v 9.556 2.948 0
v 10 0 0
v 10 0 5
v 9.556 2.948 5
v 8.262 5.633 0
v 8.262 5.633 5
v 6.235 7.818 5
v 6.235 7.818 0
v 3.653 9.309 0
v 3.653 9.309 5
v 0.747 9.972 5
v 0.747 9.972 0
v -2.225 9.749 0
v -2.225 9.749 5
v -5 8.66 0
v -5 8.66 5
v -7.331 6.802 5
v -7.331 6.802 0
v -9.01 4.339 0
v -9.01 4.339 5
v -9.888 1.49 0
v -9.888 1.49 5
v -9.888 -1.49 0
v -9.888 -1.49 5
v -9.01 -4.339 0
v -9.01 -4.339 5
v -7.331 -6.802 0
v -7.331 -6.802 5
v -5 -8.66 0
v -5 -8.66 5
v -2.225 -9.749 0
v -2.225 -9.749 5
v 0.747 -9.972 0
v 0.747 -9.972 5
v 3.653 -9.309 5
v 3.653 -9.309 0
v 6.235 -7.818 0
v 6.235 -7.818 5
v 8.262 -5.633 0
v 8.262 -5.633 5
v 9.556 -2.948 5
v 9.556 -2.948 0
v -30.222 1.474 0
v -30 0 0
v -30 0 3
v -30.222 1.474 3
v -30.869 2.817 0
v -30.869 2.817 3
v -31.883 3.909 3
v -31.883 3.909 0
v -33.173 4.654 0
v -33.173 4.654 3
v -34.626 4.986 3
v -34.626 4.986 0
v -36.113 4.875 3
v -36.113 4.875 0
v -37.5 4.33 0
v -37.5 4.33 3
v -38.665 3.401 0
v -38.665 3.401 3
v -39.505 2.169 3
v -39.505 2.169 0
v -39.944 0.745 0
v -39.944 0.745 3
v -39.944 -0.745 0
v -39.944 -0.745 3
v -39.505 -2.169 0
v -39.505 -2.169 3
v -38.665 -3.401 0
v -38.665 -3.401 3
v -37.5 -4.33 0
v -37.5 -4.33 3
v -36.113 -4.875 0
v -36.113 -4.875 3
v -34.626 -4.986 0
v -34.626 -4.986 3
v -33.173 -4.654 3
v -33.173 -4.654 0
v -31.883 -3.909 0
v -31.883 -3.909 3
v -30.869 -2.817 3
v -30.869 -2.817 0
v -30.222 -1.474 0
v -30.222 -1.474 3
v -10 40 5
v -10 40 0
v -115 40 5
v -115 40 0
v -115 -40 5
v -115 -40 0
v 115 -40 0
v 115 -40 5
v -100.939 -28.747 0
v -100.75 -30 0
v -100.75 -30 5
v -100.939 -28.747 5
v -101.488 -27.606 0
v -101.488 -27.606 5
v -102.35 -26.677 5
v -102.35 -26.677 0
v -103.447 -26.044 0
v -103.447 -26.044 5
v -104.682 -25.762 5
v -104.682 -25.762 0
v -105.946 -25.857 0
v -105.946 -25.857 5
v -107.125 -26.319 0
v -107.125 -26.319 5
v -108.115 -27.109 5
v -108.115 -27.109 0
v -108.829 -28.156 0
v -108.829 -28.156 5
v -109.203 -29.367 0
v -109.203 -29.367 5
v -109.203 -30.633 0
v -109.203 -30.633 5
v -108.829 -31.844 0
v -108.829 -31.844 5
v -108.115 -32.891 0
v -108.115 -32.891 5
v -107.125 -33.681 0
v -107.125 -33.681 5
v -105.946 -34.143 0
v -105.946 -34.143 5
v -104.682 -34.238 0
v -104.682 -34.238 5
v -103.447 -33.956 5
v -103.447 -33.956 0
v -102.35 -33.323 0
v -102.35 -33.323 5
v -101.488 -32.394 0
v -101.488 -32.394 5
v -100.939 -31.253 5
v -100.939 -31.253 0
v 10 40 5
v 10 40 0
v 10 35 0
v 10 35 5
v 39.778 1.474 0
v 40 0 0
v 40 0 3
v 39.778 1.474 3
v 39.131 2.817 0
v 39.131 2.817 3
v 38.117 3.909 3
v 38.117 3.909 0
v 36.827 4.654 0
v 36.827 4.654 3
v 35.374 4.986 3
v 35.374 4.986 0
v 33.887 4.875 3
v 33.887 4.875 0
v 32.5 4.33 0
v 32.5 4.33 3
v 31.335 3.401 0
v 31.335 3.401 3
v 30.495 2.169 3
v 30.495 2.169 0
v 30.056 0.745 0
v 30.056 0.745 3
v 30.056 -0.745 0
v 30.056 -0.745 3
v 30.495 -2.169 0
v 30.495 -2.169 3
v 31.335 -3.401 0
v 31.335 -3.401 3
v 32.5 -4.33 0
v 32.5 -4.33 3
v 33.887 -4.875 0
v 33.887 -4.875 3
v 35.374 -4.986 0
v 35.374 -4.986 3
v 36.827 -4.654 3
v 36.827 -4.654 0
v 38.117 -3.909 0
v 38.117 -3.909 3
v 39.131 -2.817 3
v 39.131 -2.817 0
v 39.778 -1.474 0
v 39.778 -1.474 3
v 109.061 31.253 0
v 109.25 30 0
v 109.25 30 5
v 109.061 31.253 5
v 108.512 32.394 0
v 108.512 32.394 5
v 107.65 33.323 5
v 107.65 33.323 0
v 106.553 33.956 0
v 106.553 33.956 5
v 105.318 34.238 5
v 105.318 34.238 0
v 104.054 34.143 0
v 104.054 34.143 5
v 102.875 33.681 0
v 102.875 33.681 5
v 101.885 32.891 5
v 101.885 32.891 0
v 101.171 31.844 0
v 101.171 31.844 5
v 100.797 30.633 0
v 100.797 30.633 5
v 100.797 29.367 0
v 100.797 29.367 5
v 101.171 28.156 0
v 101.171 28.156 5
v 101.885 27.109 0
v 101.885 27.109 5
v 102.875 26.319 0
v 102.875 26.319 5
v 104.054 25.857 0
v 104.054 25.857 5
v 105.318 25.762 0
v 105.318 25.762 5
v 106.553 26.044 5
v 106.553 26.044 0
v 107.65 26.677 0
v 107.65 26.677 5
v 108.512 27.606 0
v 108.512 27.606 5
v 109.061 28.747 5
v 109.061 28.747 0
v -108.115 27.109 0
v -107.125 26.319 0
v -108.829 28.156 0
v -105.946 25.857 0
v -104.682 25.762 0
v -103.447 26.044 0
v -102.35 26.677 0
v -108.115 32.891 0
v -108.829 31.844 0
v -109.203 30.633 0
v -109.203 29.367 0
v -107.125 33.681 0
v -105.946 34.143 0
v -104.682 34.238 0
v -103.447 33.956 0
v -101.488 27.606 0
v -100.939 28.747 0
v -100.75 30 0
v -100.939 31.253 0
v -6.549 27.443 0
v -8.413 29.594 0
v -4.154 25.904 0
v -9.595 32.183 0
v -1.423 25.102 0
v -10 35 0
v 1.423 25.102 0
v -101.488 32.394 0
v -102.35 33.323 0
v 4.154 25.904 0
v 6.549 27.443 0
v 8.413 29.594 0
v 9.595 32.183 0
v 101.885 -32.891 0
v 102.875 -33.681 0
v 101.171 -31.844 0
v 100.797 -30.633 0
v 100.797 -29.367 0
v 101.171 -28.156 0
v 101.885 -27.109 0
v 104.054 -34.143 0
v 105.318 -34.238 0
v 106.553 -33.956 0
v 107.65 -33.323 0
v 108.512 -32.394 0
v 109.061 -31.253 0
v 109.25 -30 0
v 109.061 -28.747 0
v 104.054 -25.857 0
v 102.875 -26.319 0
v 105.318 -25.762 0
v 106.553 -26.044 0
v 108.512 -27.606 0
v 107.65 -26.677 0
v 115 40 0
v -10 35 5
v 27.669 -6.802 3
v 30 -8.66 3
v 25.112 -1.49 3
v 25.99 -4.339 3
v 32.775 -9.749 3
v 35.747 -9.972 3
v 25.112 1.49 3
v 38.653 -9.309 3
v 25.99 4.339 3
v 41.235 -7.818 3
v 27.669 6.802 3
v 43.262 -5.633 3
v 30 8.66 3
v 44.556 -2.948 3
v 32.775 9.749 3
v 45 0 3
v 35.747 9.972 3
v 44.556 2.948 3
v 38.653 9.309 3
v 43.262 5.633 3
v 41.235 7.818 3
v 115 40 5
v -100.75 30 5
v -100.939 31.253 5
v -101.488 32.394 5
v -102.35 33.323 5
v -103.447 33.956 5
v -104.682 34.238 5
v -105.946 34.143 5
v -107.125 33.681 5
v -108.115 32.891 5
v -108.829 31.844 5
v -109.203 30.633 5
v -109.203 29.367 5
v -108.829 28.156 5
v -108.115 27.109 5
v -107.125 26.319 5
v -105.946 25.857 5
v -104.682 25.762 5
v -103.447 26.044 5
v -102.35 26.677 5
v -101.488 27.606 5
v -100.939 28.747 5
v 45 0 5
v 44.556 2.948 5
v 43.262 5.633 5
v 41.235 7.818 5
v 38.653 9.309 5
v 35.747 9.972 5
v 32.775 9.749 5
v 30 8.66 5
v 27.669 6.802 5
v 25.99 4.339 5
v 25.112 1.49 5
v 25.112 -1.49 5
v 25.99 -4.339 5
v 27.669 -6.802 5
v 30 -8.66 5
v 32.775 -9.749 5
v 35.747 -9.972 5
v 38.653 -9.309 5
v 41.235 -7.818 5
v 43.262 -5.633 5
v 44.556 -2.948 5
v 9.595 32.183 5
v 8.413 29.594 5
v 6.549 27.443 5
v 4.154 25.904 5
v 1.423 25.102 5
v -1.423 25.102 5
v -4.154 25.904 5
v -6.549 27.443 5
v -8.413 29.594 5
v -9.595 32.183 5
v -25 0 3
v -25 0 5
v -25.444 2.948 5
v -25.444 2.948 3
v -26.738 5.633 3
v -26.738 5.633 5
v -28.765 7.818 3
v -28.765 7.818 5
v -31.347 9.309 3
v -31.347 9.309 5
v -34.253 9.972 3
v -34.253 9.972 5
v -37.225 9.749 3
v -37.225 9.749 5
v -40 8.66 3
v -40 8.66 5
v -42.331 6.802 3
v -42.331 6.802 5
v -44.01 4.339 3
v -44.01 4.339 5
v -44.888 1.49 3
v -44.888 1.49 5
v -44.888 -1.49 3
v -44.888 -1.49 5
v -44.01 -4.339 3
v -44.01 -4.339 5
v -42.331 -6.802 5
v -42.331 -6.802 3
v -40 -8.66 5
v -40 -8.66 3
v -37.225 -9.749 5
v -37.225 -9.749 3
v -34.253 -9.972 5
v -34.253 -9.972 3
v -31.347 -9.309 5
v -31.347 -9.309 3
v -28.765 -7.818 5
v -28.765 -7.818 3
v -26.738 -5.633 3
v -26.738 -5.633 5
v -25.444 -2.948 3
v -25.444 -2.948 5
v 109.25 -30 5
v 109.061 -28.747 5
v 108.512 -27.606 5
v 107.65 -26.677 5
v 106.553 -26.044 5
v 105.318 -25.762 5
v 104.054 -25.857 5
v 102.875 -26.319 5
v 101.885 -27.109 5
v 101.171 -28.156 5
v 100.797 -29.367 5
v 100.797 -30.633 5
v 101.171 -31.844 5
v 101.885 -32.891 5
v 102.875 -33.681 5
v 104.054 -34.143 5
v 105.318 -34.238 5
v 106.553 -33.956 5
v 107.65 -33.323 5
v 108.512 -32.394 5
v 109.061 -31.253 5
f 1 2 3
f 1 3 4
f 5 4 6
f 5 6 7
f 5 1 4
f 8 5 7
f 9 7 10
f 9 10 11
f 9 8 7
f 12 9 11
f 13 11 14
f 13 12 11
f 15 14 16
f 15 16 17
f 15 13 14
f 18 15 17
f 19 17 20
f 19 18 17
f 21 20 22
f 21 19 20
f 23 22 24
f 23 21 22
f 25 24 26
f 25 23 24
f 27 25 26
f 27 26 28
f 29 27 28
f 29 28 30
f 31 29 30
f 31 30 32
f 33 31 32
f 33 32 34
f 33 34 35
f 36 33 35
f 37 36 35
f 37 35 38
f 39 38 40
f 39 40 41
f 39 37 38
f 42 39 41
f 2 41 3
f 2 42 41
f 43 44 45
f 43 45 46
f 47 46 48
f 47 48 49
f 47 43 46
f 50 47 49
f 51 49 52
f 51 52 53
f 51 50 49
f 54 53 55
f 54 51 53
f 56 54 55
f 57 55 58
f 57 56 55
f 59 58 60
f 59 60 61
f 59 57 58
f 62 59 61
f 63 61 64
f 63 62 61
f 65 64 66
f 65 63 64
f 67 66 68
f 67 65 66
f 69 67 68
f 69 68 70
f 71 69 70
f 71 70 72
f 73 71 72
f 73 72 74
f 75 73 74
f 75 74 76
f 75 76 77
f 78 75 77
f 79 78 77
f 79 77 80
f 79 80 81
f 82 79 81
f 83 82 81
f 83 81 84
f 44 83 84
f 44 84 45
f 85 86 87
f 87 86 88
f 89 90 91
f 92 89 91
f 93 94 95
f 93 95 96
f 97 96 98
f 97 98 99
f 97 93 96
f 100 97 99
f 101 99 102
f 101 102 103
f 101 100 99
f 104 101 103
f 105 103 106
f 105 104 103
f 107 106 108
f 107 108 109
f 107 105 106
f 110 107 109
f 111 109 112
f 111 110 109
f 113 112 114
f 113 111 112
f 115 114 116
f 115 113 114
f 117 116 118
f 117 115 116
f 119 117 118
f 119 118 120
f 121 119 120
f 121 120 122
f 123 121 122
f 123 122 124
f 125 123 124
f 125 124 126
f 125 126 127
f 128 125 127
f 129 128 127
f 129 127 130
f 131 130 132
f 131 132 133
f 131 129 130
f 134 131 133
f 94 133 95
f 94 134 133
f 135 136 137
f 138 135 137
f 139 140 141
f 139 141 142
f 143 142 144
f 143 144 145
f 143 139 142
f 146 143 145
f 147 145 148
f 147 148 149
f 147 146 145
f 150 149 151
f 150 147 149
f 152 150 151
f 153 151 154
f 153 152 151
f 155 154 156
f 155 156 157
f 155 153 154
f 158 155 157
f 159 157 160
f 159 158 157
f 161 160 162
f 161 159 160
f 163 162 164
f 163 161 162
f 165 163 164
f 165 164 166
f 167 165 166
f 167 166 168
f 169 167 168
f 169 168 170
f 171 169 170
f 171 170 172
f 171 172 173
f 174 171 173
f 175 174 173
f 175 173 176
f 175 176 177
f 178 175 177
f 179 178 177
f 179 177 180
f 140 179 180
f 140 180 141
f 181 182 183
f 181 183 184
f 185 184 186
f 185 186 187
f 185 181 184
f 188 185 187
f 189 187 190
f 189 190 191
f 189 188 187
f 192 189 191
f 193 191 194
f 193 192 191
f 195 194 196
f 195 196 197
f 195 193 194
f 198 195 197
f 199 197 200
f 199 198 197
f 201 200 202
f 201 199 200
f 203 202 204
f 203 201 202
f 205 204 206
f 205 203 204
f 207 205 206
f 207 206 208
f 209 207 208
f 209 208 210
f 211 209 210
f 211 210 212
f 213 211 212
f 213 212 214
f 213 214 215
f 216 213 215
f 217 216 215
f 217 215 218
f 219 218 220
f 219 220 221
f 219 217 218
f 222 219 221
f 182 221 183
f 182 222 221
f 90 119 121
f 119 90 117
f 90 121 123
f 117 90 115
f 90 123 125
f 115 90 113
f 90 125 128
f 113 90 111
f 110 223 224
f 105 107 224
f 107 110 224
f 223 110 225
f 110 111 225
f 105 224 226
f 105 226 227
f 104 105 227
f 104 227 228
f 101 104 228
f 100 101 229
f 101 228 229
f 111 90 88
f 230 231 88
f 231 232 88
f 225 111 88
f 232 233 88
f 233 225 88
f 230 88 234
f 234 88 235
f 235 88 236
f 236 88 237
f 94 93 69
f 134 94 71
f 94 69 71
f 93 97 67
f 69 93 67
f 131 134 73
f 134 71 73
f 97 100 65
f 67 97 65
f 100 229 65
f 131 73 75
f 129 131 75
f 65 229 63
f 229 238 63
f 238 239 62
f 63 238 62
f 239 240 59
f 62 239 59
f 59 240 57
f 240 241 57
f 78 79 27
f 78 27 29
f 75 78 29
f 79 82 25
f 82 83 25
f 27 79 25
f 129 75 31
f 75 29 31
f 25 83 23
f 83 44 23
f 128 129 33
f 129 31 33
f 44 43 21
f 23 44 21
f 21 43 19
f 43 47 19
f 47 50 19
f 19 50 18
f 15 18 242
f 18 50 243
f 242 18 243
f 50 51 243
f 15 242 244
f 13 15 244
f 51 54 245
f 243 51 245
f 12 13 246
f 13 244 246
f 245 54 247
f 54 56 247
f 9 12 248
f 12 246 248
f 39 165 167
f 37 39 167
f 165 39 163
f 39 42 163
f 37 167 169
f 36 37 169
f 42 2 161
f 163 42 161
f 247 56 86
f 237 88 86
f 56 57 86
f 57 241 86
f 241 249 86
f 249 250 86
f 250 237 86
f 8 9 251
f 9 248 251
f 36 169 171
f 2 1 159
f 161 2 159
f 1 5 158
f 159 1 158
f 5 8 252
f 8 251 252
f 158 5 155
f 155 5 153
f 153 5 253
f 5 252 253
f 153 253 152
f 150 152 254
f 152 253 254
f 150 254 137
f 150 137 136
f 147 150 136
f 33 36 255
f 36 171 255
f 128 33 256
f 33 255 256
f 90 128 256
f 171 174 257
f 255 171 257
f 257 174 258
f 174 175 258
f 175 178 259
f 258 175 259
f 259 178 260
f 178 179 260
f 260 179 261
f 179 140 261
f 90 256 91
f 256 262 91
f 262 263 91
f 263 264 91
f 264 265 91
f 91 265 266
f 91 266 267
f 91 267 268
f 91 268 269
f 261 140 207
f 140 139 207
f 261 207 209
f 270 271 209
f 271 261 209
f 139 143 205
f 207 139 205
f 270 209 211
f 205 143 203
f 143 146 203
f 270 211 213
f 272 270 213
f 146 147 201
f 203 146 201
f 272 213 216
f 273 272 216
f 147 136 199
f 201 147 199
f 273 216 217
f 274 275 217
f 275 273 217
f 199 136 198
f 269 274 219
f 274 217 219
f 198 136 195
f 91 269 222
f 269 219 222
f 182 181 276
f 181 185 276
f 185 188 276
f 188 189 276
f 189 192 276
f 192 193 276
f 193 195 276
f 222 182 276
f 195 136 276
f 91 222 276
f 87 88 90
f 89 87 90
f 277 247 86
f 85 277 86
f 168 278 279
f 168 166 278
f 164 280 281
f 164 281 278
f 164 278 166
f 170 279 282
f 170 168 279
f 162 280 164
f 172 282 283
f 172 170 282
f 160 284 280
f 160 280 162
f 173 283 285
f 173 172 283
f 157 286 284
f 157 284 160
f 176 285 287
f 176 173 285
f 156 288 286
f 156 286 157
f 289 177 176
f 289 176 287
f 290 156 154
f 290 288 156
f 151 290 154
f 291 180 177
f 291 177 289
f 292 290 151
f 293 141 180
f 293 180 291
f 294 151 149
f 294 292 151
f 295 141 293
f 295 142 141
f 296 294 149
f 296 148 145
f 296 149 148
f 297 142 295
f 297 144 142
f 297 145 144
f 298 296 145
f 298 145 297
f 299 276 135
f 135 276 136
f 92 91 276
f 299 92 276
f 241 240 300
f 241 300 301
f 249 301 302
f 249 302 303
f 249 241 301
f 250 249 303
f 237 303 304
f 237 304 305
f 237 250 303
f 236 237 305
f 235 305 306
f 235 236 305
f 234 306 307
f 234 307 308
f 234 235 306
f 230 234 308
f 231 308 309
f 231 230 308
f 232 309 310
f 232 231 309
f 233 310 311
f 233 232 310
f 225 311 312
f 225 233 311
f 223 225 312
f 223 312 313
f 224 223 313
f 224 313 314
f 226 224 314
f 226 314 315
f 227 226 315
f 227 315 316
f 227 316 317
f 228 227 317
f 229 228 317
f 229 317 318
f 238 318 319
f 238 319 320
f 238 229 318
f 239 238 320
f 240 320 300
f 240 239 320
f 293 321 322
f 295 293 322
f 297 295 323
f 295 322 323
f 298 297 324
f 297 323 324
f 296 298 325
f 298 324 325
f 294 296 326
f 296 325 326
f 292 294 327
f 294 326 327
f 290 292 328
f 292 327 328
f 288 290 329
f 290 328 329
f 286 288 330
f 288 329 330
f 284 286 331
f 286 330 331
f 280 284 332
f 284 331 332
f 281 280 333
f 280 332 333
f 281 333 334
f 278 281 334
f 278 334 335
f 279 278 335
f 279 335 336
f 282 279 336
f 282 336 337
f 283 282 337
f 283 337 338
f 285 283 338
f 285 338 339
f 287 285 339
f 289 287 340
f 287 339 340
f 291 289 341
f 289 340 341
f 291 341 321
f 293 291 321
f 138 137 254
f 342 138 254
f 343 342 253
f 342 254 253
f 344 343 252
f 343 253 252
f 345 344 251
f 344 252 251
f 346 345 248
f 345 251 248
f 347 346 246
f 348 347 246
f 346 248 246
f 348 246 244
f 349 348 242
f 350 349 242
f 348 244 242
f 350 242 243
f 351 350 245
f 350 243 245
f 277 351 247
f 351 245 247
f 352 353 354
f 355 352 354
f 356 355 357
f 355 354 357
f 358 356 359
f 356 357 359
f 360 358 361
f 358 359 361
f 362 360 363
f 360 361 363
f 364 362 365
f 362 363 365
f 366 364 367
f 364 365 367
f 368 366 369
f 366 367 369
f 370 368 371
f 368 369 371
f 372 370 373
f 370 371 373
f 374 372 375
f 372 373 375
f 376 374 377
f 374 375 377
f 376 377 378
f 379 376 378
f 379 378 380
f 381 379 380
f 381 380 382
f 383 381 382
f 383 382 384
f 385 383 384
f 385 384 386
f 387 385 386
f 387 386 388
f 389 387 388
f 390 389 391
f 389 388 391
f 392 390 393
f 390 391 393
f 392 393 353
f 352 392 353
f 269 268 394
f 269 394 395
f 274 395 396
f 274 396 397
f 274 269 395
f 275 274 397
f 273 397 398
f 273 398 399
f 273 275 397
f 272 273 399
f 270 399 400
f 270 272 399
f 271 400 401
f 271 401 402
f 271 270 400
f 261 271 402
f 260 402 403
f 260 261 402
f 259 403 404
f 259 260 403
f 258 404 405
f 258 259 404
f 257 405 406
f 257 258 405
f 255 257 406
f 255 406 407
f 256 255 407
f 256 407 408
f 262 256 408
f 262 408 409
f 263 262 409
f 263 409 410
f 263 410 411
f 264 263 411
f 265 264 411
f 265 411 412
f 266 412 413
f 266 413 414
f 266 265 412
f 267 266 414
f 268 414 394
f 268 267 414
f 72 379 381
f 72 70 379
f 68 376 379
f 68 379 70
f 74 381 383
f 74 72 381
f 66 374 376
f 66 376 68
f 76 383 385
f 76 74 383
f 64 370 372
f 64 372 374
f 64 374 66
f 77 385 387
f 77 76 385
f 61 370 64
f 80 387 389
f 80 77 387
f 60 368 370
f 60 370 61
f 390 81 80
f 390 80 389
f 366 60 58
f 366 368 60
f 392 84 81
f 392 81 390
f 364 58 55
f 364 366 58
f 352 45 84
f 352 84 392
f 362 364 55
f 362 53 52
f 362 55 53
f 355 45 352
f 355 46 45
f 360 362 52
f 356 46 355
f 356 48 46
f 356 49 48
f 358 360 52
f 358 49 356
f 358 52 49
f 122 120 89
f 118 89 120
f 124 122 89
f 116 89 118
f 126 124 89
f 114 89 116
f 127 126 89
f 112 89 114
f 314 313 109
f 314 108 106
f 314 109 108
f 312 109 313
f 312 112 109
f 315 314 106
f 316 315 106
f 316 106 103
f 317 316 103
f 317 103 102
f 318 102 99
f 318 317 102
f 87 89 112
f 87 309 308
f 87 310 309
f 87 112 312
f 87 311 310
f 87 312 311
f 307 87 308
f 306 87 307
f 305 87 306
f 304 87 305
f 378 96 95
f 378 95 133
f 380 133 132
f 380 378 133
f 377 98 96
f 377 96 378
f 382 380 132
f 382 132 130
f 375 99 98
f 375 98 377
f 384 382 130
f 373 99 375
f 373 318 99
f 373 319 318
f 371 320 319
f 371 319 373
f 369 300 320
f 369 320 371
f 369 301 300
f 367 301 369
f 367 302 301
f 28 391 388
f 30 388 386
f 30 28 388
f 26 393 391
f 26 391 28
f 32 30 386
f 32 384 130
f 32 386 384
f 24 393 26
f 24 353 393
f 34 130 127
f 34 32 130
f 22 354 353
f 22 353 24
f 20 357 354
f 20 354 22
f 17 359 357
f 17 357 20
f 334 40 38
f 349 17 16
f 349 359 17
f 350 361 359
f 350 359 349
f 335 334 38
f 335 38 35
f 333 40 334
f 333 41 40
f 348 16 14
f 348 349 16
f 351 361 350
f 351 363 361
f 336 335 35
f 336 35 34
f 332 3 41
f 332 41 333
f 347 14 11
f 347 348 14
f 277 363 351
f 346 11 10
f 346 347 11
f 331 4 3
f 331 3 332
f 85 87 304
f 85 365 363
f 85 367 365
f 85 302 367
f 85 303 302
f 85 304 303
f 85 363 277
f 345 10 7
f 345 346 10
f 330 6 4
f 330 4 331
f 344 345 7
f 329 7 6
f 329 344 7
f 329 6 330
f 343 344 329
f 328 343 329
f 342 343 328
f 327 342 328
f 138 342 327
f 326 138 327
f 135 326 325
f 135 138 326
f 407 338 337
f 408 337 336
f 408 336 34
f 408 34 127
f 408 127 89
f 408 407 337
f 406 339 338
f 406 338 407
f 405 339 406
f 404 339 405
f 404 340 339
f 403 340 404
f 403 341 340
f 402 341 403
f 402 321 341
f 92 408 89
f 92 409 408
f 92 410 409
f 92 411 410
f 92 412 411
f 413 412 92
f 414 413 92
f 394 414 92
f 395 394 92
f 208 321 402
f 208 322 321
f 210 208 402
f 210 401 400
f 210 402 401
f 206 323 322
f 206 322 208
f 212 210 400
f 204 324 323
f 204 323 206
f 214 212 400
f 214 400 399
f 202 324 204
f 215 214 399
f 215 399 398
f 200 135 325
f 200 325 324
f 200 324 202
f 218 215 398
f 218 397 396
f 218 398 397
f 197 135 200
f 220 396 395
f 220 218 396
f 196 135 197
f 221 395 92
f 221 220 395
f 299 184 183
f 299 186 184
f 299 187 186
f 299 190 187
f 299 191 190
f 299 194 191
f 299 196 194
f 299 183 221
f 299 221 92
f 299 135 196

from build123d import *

# Parameters (mm, degrees)
F0_R     = 4.25
F0_R_2   = 5
F0_R_3   = 10
F1_DEPTH = 5
F2_R     = 5
F2_R_2   = 10
F3_DEPTH = 2


with BuildPart() as f1:
    # F0 (on Top) → F1 (new body)
    with BuildSketch(Plane.XY):
        with BuildLine():
            Line((-10, 40), (-115, 40))
            Line((-115, 40), (-115, -40))
            Line((-115, -40), (115, -40))
            Line((115, -40), (115, 40))
            Line((115, 40), (10, 40))
            Line((10, 40), (10, 35))
            ThreePointArc((10, 35), (0, 25), (-10, 35))
            Line((-10, 35), (-10, 40))
        make_face()
        with Locations((-105, -30)):
            Circle(F0_R, mode=Mode.SUBTRACT)
        with Locations((105, -30)):
            Circle(F0_R, mode=Mode.SUBTRACT)
        with Locations((-35, 0)):
            Circle(F0_R_2, mode=Mode.SUBTRACT)
        with Locations((-105, 30)):
            Circle(F0_R, mode=Mode.SUBTRACT)
        Circle(F0_R_3, mode=Mode.SUBTRACT)
        with Locations((35, 0)):
            Circle(F0_R_2, mode=Mode.SUBTRACT)
        with Locations((105, 30)):
            Circle(F0_R, mode=Mode.SUBTRACT)
    extrude(amount=F1_DEPTH)

    # F2 (on face) → F3 (cut)
    with BuildSketch(Plane.XY.offset(5)):
        with Locations((-35, 0)):
            Circle(F2_R)
        with Locations((35, 0)):
            Circle(F2_R)
        with Locations((35, 0)):
            Circle(F2_R_2)
        with Locations((35, 0)):
            Circle(F2_R, mode=Mode.SUBTRACT)
        with Locations((-35, 0)):
            Circle(F2_R_2)
        with Locations((-35, 0)):
            Circle(F2_R, mode=Mode.SUBTRACT)
    extrude(amount=-F3_DEPTH, mode=Mode.SUBTRACT)


solid = f1.part
